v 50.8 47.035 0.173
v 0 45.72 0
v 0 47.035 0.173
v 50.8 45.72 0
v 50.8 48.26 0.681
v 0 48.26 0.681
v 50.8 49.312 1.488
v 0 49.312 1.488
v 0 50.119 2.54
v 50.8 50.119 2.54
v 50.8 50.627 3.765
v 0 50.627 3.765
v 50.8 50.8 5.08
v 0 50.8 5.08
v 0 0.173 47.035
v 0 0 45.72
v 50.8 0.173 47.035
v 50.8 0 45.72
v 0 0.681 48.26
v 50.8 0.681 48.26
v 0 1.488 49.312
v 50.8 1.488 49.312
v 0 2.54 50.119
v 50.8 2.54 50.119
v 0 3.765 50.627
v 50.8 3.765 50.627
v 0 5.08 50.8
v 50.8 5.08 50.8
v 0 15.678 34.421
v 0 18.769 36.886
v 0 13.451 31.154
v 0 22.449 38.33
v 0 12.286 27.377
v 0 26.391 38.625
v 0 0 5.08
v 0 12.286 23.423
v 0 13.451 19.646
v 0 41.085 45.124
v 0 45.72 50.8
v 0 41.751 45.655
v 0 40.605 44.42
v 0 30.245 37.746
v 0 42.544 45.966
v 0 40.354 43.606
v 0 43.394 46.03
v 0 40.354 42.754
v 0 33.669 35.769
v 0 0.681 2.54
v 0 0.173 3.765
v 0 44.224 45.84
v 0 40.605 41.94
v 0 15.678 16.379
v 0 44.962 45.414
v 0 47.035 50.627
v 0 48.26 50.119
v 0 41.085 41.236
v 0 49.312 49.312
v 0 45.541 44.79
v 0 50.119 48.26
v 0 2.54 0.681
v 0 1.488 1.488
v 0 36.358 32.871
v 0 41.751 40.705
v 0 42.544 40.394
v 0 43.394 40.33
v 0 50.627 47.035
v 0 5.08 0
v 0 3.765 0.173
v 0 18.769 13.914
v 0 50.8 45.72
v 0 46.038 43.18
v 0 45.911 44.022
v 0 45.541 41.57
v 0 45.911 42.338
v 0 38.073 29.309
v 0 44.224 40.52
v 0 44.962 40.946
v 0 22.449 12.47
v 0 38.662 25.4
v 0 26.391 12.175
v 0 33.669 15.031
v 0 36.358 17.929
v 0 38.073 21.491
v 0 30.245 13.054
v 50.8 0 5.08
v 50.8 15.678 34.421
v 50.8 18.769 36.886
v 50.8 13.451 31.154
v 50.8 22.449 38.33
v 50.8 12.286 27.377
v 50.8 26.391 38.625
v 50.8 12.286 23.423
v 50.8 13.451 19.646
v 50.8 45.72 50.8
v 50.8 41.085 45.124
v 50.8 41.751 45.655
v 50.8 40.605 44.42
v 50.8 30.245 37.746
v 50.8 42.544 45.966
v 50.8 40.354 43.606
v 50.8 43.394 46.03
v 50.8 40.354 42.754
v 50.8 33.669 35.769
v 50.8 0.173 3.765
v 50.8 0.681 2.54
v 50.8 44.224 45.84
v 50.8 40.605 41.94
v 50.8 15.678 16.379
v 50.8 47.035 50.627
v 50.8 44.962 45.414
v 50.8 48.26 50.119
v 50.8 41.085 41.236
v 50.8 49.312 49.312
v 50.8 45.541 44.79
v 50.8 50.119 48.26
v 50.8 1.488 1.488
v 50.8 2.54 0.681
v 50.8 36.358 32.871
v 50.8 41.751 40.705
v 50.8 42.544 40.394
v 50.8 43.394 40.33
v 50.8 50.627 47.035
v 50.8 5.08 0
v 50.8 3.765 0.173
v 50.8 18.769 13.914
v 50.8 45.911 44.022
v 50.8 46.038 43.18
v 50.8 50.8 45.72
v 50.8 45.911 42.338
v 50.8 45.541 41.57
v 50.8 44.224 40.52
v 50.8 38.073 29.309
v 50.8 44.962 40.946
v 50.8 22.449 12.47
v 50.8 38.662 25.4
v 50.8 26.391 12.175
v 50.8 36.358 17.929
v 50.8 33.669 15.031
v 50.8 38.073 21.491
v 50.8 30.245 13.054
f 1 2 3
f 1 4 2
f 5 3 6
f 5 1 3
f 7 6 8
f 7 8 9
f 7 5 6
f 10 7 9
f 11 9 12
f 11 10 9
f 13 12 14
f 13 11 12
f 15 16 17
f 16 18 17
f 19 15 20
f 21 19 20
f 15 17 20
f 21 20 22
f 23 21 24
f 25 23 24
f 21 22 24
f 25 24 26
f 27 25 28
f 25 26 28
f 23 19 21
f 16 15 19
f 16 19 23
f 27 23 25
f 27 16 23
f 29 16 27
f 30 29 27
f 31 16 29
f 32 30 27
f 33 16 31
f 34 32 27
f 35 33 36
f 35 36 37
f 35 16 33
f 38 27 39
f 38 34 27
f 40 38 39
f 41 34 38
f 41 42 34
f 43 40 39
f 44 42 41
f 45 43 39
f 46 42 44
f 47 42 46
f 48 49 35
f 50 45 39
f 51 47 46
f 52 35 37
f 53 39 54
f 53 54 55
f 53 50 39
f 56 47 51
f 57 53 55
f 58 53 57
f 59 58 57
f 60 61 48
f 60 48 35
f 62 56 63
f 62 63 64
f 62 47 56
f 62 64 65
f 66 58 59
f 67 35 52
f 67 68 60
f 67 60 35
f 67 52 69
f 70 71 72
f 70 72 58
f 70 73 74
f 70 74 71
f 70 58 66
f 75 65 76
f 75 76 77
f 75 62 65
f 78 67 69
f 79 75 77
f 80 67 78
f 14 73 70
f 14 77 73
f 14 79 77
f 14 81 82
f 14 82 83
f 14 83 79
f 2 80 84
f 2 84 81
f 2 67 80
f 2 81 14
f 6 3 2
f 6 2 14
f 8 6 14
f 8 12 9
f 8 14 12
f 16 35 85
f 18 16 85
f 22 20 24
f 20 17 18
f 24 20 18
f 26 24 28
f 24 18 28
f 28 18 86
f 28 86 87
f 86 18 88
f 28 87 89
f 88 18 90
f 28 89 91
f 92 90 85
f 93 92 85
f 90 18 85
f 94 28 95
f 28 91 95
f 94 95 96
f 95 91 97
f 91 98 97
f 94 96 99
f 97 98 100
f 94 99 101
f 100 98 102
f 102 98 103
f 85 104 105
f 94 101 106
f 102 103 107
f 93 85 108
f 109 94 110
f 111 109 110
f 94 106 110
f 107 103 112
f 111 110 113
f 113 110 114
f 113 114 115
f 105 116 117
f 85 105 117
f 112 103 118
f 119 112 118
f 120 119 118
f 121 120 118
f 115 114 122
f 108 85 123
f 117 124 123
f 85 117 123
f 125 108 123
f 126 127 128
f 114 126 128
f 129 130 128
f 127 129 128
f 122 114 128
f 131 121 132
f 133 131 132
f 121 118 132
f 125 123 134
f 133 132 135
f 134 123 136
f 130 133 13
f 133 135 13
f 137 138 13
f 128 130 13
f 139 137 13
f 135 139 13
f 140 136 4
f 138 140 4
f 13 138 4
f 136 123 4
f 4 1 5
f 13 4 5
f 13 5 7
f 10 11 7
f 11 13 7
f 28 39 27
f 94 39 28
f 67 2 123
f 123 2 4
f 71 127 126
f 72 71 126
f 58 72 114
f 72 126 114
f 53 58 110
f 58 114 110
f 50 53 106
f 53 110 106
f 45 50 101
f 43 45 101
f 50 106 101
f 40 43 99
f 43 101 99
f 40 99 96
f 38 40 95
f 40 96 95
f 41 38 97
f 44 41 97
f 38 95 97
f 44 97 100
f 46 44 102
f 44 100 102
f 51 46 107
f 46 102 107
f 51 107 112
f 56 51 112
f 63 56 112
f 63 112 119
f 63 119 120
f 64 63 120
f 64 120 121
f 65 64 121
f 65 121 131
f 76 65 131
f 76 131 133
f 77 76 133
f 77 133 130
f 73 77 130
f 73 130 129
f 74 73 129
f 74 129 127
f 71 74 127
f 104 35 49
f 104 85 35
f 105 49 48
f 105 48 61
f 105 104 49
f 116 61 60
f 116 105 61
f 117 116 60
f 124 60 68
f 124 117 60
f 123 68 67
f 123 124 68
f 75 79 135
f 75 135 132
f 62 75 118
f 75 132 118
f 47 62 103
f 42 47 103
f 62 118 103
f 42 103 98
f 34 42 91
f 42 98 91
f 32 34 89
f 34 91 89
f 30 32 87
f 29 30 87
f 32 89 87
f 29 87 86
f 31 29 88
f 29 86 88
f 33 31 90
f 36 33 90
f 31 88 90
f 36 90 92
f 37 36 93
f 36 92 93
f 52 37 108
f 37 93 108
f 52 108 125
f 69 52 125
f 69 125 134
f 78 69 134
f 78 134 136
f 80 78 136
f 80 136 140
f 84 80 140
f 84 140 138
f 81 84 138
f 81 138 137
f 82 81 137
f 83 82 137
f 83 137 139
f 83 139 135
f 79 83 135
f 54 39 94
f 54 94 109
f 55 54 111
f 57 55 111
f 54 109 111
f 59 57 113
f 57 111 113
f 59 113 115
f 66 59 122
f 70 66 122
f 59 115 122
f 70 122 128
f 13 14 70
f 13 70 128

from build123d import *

# Parameters (mm, degrees)
F0_W     = 50.8
F0_H     = 50.8
F1_DEPTH = 50.8
F2_R     = 13.262448
F3_DEPTH = 50.801
F4_R     = 5.08
F5_R     = 2.8575
F6_DEPTH = 50.801


with BuildPart() as f1:
    # F0 (on Top) → F1 (new body)
    with BuildSketch(Plane.XY):
        with Locations((25.4, 25.4)):
            Rectangle(F0_W, F0_H)
    extrude(amount=F1_DEPTH)

    # F2 (on face) → F3 (cut, through all)
    with BuildSketch(Plane.YZ.offset(50.8)):
        with Locations((25.4, 25.4)):
            Circle(F2_R)
    extrude(amount=-F3_DEPTH, mode=Mode.SUBTRACT)

    # F4
    f4_edges = [f1.edges().sort_by_distance(p)[0] for p in [
        (25.4, 50.8, 50.8),
        (25.4, 0, 50.8),
        (25.4, 50.8, 0),
        (25.4, 0, 0),
    ]]
    fillet(f4_edges, radius=F4_R)

    # F5 (on face) → F6 (cut, through all)
    with BuildSketch(Plane.YZ.offset(50.8)):
        with Locations((43.18, 43.18)):
            Circle(F5_R)
    extrude(amount=-F6_DEPTH, mode=Mode.SUBTRACT)


solid = f1.part
